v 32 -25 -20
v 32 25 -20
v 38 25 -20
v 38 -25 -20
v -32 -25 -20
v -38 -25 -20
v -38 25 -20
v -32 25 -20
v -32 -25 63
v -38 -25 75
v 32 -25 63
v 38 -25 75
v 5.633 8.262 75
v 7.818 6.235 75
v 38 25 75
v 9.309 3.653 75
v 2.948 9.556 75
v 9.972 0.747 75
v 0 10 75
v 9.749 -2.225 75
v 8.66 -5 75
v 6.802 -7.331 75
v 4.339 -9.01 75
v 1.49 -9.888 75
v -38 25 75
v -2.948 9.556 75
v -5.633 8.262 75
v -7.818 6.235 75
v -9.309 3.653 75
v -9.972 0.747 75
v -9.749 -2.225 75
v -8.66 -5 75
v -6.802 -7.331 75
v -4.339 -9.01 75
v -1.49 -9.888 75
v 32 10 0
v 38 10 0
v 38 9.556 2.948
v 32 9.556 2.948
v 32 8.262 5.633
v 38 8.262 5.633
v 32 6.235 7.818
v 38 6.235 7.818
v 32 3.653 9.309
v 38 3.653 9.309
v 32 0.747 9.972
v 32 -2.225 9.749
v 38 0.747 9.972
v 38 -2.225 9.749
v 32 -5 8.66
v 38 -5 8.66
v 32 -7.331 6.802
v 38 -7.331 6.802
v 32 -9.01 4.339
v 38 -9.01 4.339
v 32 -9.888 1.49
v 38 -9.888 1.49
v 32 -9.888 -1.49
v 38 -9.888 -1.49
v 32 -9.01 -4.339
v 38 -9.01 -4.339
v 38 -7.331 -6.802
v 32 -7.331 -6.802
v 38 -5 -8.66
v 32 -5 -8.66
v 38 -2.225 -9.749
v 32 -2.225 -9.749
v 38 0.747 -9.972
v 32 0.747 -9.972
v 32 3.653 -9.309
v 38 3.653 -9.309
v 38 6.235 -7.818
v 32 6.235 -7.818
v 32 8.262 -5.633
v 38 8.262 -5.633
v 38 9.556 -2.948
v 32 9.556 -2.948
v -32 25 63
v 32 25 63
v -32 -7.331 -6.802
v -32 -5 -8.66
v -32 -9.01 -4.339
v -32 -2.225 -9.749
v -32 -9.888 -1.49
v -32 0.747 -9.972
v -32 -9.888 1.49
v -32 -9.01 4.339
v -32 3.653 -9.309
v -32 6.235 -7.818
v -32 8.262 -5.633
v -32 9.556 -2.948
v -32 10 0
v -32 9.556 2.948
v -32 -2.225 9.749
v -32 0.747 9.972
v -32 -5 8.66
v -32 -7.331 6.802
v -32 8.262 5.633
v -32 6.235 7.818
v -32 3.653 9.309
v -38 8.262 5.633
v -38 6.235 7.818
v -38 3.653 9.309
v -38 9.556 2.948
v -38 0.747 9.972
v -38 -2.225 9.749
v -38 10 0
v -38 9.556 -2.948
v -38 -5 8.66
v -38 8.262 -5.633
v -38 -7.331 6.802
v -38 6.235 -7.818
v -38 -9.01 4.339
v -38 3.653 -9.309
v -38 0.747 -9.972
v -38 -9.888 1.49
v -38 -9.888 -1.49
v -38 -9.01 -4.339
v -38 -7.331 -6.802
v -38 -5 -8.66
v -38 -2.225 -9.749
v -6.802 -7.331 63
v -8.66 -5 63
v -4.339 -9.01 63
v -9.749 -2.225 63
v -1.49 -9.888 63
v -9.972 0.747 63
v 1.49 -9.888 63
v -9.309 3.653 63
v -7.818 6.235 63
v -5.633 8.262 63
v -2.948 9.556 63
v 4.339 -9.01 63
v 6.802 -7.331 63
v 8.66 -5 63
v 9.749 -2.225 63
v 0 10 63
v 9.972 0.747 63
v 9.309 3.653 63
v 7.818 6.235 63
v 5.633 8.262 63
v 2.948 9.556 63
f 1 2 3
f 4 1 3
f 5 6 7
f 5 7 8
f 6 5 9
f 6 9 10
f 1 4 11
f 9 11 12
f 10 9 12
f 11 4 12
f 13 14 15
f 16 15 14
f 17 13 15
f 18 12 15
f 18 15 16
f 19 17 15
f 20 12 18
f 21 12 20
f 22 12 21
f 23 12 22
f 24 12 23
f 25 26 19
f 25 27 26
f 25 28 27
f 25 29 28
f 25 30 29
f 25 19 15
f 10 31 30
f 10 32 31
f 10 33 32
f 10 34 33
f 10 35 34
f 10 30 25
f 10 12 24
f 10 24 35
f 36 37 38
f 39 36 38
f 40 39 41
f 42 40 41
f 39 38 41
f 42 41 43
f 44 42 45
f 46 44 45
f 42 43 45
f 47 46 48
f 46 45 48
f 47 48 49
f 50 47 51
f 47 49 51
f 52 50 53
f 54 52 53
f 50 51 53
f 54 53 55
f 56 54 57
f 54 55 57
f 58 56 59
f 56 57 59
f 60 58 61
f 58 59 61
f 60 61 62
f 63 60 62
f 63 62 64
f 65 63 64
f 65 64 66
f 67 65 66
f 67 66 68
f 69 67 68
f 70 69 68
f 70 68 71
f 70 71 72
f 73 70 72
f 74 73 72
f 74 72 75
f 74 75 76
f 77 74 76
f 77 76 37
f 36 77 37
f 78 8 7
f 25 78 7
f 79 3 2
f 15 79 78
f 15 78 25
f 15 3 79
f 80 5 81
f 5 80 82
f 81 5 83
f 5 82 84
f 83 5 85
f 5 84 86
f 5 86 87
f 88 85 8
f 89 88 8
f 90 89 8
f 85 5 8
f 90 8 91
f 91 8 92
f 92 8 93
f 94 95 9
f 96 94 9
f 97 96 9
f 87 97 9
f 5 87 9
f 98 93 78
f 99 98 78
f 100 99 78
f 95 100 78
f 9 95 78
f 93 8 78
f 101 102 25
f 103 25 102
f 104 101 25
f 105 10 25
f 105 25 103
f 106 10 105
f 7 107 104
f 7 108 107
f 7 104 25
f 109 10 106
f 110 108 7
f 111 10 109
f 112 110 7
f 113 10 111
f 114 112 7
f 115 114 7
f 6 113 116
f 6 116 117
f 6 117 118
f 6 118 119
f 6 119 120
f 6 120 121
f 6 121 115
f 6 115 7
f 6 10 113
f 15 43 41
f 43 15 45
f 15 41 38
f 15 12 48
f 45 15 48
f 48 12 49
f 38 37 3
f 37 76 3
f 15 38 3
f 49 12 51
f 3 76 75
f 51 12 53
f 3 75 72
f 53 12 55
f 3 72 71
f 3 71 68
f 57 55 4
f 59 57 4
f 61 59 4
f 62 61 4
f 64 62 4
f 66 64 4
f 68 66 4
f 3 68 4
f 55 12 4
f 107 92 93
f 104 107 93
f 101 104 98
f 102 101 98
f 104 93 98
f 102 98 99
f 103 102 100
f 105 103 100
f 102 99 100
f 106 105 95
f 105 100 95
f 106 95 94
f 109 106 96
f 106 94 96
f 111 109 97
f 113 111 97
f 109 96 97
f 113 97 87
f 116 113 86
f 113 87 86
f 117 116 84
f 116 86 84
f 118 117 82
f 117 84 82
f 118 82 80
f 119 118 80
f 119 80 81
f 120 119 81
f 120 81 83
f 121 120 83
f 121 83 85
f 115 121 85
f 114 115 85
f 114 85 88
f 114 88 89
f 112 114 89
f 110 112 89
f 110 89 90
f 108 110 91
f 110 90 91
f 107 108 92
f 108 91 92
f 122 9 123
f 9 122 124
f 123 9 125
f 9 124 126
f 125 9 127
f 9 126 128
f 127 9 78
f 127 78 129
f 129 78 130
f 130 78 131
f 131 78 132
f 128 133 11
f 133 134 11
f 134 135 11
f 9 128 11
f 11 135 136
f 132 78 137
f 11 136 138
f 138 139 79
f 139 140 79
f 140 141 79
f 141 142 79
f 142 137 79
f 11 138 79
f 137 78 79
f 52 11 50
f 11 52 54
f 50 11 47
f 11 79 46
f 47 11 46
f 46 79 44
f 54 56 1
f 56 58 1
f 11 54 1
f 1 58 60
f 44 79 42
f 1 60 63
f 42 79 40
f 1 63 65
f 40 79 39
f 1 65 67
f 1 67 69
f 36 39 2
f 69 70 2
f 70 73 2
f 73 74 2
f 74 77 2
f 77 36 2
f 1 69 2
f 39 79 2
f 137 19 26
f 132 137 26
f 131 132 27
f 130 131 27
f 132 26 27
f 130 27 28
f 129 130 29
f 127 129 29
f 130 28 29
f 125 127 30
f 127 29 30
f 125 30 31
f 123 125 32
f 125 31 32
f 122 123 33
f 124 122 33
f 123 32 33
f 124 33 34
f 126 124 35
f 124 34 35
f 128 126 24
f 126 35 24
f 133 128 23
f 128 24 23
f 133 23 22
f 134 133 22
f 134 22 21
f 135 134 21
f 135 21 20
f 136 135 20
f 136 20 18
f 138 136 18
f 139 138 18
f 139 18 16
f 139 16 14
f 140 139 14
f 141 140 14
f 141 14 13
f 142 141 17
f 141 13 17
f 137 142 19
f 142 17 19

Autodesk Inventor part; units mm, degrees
ref_plane "YZ Plane" through (0, 0, 0) normal (1, 0, 0) x (0, 1, 0)
ref_plane "XZ Plane" through (0, 0, 0) normal (0, 1, 0) x (-1, 0, 0)
ref_plane "XY Plane" through (0, 0, 0) normal (0, 0, 1) x (1, 0, 0)
sketch "Sketch1" plane through (0, 0, 0) normal (1, 0, 0) x (0, 1, 0)
  line L0 (75, 0) -> (75, -38)
  line L1 (75, -38) -> (-20, -38)
  line L2 (-20, -38) -> (-20, 0)
  line L3 (-20, 0) -> (75, 0) construction
  line L4 (75, 0) -> (75, 38)
  line L5 (75, 38) -> (-20, 38)
  line L6 (-20, 38) -> (-20, 0)
  point P0 (0, 0)
  dimension "d0" = 38
  dimension "d3" = 75
  dimension "d4" = 20
extrude "Extrusion1" add sketch "Sketch1" along normal mid plane 50
sketch "Sketch2" plane through (25, 0, 0) normal (1, 0, 0) x (0, 0, -1)
  line L0 (38, 75) -> (-38, 75) projected
  line L1 (-38, 75) -> (-38, -20) projected
  line L2 (-38, -20) -> (38, -20) projected
  line L3 (-32, -20) -> (32, -20)
  line L4 (32, -20) -> (32, 63)
  line L5 (32, 63) -> (-32, 63)
  line L6 (-32, 63) -> (-32, -20)
  line L7 (0, 63) -> (0, -20) construction
  point P0 (0, 0)
  dimension "d7" = 6
  dimension "d8" = 12
extrude "Extrusion2" cut sketch "Sketch2" against normal through all
sketch "Sketch3" plane through (-25, -20, 38) normal (0, 0, 1) x (1, 0, 0)
  circle A0 centre (25, 20) radius 10
  dimension "d11" = 20
extrude "Extrusion3" cut sketch "Sketch3" against normal through all
sketch "Sketch4" plane through (-25, 75, 38) normal (0, 1, 0) x (1, 0, 0)
  circle A0 centre (25, 38) radius 10
  dimension "d15" = 20
extrude "Extrusion4" cut sketch "Sketch4" against normal through all
move or copy body "Move Body1" bodies to move or copy 1 copy no rotation origin (0, 0, 0) rotation axis (1, 0, 0) rotation angle 90
move or copy body "Move Body2" bodies to move or copy 1 copy no rotation origin (0, 0, 0) rotation axis (0, 0, 1) rotation angle 90
properties part number "HipYaw_v2"
